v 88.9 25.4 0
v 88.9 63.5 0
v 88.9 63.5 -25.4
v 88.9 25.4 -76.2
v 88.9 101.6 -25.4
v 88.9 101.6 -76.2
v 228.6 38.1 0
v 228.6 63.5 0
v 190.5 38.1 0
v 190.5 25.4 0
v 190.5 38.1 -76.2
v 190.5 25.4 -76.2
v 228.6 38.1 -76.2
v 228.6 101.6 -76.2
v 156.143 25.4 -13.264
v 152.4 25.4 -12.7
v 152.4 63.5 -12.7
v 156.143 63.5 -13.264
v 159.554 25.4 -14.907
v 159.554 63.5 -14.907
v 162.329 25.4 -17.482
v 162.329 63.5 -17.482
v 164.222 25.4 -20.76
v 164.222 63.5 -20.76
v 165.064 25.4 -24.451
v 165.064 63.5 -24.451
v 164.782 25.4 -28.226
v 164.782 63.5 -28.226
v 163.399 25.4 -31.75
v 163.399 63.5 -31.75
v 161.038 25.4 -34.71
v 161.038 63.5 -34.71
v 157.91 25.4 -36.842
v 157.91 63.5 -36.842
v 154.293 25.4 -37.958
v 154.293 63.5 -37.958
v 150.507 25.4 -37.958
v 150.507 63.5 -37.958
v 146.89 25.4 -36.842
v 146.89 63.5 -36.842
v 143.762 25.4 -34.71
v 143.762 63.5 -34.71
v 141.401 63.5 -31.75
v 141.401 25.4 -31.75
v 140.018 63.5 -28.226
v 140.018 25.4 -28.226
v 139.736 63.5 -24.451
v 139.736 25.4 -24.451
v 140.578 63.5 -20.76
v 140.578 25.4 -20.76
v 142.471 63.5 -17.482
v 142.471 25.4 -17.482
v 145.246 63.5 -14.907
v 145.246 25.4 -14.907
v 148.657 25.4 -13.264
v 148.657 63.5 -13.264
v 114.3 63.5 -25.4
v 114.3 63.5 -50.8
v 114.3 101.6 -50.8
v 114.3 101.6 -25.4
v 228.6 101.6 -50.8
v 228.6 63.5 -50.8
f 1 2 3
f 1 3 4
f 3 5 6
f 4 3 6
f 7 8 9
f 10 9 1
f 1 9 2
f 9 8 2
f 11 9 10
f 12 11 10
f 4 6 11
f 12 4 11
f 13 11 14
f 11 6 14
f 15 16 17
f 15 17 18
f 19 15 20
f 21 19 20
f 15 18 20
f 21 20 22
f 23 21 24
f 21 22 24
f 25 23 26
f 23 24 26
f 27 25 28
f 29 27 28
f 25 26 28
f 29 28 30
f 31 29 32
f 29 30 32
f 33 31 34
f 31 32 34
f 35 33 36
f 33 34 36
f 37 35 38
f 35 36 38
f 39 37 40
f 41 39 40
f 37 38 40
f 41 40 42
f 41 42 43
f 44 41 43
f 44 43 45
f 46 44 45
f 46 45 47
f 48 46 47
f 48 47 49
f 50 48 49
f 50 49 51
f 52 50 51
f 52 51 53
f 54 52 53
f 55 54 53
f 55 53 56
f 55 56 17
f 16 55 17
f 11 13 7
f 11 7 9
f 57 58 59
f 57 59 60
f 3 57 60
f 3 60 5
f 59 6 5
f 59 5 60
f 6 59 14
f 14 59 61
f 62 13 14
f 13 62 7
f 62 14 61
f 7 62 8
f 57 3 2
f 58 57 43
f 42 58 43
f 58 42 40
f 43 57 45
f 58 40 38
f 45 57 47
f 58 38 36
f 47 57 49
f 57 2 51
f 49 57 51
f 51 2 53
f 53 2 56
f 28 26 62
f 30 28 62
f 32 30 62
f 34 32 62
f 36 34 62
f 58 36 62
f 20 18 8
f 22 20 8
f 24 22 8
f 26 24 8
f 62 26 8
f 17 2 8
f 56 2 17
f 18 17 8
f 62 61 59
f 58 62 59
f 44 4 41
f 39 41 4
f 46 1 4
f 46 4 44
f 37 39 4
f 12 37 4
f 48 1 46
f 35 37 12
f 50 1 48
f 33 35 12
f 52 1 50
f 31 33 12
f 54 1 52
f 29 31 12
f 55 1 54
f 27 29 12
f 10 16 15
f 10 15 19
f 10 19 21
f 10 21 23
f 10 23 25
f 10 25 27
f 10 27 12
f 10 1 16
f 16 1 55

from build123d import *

# Parameters (mm, degrees)
BOSS_EXTRUDE1_START     = -12.7
BOSS_EXTRUDE1_DEPTH     = 76.2
BOSS_EXTRUDE2_START     = -50.8
BOSS_EXTRUDE2_DEPTH     = 38.1
SKETCH7_R               = 12.7
CUT_EXTRUDE1_DEPTH      = 257.841604885
CUT_EXTRUDE2_DEPTH      = 262.509005581
CUT_EXTRUDE2_DEPTH_BACK = 262.509005581


with BuildPart() as part:
    # Sketch5 → Boss-Extrude1 (new body)
    with BuildSketch(Plane(origin=(0, 114.3, 0), x_dir=(-1, 0, 0), z_dir=(0, 1, 0)).offset(BOSS_EXTRUDE1_START)):
        Polygon((-88.9, -25.4), (-88.9, -76.2), (-228.6, -76.2), (-228.6, -50.8), (-114.3, -50.8), (-114.3, -25.4), align=None)
    extrude(amount=-BOSS_EXTRUDE1_DEPTH)

    # Sketch6 → Boss-Extrude2 (add)
    with BuildSketch(Plane(origin=(0, 114.3, 0), x_dir=(-1, 0, 0), z_dir=(0, 1, 0)).offset(BOSS_EXTRUDE2_START)):
        Polygon((-228.6, 0), (-88.9, 0), (-88.9, -25.4), (-114.3, -25.4), (-114.3, -50.8), (-228.6, -50.8), align=None)
    extrude(amount=-BOSS_EXTRUDE2_DEPTH)

    # Sketch7 → Cut-Extrude1 (cut, through all)
    with BuildSketch(Plane(origin=(0, 114.3, 0), x_dir=(-1, 0, 0), z_dir=(0, 1, 0))):
        with Locations(Location((-152.4, -25.4, 0), (0, 0, 90))):
            Circle(SKETCH7_R)
    extrude(amount=-CUT_EXTRUDE1_DEPTH, mode=Mode.SUBTRACT)

    # Sketch8 → Cut-Extrude2 (cut, two sides: drawn at the far end of the back side and taken through both)
    with BuildSketch(Plane.XY.offset(-CUT_EXTRUDE2_DEPTH_BACK)):
        Polygon((545.509367729, 38.1), (228.6, 38.1), (190.5, 38.1), (190.5, 25.4), (190.5, -291.509367729), (621.753014004, -755.995134283), (976.762381733, -426.385766553), align=None)
    extrude(amount=CUT_EXTRUDE2_DEPTH + CUT_EXTRUDE2_DEPTH_BACK, mode=Mode.SUBTRACT)


solid = part.part
